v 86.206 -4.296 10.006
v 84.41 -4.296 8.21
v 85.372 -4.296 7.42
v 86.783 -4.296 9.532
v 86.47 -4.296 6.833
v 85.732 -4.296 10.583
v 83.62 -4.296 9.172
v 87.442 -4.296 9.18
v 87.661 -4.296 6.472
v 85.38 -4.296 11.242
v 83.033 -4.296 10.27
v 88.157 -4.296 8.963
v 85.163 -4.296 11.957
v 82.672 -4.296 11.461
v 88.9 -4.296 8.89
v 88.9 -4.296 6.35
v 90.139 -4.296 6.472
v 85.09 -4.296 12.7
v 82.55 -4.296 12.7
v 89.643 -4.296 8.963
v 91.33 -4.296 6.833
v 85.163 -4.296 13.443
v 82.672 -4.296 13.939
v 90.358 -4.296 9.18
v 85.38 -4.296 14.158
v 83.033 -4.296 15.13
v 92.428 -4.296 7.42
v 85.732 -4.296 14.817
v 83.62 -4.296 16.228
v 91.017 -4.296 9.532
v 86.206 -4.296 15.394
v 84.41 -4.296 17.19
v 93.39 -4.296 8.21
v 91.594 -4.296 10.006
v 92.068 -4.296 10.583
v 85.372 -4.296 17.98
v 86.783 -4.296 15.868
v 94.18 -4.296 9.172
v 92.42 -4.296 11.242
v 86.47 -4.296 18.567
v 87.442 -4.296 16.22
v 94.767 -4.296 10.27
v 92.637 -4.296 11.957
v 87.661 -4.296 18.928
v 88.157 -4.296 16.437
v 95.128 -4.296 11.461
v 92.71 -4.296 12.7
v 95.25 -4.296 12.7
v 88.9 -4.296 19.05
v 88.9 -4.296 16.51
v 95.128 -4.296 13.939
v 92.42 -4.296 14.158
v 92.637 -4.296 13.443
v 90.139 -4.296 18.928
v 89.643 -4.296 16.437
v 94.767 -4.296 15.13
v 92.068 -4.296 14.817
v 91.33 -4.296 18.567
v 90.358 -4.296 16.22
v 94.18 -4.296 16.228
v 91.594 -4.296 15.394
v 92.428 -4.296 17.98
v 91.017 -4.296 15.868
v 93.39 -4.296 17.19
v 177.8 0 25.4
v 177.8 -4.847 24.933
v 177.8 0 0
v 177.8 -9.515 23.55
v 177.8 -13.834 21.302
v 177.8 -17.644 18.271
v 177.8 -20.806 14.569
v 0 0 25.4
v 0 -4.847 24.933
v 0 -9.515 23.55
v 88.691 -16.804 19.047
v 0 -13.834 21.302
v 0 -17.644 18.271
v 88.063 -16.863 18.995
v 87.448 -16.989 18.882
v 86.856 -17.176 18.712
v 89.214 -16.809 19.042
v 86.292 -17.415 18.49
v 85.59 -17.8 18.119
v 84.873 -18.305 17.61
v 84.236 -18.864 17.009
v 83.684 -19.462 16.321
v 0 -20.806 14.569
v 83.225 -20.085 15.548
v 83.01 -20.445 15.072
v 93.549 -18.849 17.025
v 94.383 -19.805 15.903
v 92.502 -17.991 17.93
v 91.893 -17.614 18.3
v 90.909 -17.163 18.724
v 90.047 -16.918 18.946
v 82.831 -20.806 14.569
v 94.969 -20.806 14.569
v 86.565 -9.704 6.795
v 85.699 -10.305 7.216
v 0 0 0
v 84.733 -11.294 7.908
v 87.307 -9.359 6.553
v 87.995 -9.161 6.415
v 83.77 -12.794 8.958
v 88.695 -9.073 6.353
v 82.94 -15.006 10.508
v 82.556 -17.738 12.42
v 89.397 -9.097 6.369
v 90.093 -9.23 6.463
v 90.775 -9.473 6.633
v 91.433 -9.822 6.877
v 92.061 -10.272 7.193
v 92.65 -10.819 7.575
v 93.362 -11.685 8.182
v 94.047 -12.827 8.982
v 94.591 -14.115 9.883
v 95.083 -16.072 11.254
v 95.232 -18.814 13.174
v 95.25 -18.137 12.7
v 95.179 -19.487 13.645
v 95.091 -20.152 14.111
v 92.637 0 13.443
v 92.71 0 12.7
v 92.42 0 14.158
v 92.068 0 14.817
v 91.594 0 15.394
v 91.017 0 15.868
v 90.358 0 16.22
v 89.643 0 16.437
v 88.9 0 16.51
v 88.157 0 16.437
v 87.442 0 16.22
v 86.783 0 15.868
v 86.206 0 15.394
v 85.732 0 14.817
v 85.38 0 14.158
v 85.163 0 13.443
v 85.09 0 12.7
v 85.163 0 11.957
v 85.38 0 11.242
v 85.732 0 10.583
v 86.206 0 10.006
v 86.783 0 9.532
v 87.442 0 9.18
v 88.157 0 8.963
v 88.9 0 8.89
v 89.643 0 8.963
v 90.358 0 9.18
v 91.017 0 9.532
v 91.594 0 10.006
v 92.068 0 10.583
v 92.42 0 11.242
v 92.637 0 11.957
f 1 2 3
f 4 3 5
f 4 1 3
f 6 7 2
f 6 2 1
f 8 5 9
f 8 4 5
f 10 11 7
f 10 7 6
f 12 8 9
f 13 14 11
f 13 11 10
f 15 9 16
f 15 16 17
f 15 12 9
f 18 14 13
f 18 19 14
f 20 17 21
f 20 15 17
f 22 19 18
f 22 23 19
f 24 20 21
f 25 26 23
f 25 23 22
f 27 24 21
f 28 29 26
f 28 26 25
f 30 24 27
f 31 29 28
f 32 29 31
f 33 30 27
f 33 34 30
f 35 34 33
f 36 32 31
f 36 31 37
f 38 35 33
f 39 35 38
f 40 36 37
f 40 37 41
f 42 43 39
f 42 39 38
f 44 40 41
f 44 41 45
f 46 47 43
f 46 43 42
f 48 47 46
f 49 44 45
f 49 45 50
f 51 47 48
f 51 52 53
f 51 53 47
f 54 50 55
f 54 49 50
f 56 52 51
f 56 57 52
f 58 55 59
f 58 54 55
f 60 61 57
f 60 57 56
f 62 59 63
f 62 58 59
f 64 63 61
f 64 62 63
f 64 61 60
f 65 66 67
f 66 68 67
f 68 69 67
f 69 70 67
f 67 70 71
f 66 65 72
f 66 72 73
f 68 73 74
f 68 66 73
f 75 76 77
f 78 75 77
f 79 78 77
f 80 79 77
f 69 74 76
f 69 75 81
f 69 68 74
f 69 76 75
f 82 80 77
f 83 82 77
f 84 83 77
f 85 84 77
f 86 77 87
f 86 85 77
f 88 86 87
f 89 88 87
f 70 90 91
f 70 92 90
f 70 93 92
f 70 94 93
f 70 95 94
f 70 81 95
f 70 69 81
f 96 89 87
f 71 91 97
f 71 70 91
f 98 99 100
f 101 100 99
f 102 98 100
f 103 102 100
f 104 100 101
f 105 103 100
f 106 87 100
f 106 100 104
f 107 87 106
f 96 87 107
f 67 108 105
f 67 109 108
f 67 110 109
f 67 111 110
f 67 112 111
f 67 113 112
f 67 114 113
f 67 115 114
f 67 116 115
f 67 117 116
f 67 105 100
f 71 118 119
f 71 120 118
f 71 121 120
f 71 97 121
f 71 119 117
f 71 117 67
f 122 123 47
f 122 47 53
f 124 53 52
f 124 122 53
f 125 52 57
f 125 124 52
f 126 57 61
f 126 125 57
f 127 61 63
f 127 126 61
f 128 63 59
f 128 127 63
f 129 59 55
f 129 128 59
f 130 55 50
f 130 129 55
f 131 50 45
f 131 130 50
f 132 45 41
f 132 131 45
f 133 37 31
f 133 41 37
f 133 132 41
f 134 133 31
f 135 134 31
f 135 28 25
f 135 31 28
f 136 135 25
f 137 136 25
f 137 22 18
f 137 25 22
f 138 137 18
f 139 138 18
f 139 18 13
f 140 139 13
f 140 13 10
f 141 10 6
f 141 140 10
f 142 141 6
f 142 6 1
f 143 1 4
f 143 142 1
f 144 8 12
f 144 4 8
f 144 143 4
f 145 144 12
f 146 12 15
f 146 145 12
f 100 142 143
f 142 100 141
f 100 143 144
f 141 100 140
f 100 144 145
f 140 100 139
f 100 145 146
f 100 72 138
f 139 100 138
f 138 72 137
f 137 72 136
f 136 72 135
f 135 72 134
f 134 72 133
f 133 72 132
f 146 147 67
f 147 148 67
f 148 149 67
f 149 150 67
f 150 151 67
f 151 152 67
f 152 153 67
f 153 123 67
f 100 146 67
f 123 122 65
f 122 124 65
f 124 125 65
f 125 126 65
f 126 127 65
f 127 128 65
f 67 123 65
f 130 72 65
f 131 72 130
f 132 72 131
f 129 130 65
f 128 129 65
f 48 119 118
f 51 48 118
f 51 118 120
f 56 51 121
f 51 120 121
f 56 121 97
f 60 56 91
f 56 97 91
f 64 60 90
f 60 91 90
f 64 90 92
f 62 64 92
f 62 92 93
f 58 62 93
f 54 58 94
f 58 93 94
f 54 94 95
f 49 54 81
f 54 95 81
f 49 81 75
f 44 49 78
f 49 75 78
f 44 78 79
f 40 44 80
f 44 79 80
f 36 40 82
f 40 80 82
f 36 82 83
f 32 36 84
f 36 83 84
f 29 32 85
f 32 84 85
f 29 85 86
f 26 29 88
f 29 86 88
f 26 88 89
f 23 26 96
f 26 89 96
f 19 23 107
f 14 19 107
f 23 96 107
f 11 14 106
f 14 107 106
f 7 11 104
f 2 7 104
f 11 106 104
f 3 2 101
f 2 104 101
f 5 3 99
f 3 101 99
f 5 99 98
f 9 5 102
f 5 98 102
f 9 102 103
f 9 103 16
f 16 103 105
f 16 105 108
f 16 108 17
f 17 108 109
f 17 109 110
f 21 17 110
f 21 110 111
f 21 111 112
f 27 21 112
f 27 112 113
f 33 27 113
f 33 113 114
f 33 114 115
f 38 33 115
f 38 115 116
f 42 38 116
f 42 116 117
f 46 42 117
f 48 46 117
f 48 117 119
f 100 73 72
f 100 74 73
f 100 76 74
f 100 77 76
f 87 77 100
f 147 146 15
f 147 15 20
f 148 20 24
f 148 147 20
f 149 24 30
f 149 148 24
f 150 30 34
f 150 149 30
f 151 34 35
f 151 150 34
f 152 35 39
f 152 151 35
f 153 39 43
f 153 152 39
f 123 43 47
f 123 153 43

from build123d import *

# Parameters (mm, degrees)
F0_W     = 177.8
F0_H     = 25.4
F1_ANGLE = 55
F3_DEPTH = 20.8074619249
F5_R     = 6.35
F6_DEPTH = 16.51


with BuildPart() as f1:
    # F0 (on Front) → F1 (revolve)
    with BuildSketch(Plane.XZ):
        with Locations((88.9, 12.7)):
            Rectangle(F0_W, F0_H)
    revolve(axis=Axis((88.9, 0, 0), (1, 0, 0)), revolution_arc=F1_ANGLE)

    # F2 (on Front) → F3 (cut, through all)
    with BuildSketch(Plane.XZ):
        with BuildLine():
            ThreePointArc((88.9, 8.89), (91.5940768363, 10.0059231637), (92.71, 12.7))
            ThreePointArc((92.71, 12.7), (86.2059231637, 15.3940768363), (88.9, 8.89))
        make_face()
    extrude(amount=F3_DEPTH, mode=Mode.SUBTRACT)

    # F5 (on plane+point) → F6 (cut)
    with BuildSketch(Plane.XZ.offset(20.8064619249)):
        with Locations((88.9, 12.7)):
            Circle(F5_R)
    extrude(amount=-F6_DEPTH, mode=Mode.SUBTRACT)


solid = f1.part
